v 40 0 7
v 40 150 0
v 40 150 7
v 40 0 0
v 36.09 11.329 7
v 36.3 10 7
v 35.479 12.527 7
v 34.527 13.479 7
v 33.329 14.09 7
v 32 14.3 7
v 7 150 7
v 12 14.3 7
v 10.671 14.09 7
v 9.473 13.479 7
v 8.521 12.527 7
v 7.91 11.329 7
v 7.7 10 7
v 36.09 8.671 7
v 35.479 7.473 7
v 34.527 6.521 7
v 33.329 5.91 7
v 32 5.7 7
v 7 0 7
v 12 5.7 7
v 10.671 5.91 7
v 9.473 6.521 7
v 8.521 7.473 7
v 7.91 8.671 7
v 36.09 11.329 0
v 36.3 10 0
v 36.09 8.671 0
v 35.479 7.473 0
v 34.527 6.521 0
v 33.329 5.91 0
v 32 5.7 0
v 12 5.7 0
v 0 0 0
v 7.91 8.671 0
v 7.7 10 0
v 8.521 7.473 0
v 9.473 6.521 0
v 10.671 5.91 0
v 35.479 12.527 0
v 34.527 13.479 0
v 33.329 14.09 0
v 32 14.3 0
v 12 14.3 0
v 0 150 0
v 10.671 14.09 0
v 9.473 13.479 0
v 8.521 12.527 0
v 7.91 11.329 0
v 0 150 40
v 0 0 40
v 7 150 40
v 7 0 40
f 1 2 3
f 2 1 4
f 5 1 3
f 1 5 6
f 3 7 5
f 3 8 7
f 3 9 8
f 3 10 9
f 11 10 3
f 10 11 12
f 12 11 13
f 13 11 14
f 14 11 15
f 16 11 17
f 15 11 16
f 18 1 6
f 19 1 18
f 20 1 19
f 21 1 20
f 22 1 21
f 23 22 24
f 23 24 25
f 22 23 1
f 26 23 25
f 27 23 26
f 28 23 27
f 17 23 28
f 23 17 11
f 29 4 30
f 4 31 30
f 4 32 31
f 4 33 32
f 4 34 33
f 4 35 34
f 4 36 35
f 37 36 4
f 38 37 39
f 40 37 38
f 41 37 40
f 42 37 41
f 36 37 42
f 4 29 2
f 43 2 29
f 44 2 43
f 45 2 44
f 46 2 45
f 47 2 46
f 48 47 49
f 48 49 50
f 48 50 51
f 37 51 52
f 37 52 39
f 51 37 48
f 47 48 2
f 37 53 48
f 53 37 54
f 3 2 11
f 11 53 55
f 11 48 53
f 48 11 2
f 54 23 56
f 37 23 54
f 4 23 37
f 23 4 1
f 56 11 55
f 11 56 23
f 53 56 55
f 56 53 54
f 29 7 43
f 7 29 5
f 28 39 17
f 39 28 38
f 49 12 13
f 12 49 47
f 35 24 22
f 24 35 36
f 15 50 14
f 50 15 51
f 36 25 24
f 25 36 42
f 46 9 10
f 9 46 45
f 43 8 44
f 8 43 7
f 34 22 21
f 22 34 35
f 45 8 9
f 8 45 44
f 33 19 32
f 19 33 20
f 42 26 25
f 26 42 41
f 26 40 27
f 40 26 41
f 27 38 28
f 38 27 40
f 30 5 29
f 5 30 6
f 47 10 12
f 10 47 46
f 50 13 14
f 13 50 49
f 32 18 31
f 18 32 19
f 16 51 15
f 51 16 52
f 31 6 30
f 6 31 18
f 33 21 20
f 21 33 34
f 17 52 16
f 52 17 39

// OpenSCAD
x=23;
y=16;
z=7;



//ecrou();
butee();

module butee()
{
l=150;
ep=7;
    difference()
    {
        union()
        {
        cube([40,l,ep]);
        cube([ep,l,40]);
        }
        hull()
        {
            translate([12,10,0]) cylinder(ep,4.3,4.3,$fn=20);
            translate([32,10,0]) cylinder(ep,4.3,4.3,$fn=20);

        }
    }
}

module ecrou()
{
    difference()
    {

    cube([x,y,z]);
    translate([x/2,5,0]) cylinder(z,3.8,3.8,$fn=20);
    }
}
